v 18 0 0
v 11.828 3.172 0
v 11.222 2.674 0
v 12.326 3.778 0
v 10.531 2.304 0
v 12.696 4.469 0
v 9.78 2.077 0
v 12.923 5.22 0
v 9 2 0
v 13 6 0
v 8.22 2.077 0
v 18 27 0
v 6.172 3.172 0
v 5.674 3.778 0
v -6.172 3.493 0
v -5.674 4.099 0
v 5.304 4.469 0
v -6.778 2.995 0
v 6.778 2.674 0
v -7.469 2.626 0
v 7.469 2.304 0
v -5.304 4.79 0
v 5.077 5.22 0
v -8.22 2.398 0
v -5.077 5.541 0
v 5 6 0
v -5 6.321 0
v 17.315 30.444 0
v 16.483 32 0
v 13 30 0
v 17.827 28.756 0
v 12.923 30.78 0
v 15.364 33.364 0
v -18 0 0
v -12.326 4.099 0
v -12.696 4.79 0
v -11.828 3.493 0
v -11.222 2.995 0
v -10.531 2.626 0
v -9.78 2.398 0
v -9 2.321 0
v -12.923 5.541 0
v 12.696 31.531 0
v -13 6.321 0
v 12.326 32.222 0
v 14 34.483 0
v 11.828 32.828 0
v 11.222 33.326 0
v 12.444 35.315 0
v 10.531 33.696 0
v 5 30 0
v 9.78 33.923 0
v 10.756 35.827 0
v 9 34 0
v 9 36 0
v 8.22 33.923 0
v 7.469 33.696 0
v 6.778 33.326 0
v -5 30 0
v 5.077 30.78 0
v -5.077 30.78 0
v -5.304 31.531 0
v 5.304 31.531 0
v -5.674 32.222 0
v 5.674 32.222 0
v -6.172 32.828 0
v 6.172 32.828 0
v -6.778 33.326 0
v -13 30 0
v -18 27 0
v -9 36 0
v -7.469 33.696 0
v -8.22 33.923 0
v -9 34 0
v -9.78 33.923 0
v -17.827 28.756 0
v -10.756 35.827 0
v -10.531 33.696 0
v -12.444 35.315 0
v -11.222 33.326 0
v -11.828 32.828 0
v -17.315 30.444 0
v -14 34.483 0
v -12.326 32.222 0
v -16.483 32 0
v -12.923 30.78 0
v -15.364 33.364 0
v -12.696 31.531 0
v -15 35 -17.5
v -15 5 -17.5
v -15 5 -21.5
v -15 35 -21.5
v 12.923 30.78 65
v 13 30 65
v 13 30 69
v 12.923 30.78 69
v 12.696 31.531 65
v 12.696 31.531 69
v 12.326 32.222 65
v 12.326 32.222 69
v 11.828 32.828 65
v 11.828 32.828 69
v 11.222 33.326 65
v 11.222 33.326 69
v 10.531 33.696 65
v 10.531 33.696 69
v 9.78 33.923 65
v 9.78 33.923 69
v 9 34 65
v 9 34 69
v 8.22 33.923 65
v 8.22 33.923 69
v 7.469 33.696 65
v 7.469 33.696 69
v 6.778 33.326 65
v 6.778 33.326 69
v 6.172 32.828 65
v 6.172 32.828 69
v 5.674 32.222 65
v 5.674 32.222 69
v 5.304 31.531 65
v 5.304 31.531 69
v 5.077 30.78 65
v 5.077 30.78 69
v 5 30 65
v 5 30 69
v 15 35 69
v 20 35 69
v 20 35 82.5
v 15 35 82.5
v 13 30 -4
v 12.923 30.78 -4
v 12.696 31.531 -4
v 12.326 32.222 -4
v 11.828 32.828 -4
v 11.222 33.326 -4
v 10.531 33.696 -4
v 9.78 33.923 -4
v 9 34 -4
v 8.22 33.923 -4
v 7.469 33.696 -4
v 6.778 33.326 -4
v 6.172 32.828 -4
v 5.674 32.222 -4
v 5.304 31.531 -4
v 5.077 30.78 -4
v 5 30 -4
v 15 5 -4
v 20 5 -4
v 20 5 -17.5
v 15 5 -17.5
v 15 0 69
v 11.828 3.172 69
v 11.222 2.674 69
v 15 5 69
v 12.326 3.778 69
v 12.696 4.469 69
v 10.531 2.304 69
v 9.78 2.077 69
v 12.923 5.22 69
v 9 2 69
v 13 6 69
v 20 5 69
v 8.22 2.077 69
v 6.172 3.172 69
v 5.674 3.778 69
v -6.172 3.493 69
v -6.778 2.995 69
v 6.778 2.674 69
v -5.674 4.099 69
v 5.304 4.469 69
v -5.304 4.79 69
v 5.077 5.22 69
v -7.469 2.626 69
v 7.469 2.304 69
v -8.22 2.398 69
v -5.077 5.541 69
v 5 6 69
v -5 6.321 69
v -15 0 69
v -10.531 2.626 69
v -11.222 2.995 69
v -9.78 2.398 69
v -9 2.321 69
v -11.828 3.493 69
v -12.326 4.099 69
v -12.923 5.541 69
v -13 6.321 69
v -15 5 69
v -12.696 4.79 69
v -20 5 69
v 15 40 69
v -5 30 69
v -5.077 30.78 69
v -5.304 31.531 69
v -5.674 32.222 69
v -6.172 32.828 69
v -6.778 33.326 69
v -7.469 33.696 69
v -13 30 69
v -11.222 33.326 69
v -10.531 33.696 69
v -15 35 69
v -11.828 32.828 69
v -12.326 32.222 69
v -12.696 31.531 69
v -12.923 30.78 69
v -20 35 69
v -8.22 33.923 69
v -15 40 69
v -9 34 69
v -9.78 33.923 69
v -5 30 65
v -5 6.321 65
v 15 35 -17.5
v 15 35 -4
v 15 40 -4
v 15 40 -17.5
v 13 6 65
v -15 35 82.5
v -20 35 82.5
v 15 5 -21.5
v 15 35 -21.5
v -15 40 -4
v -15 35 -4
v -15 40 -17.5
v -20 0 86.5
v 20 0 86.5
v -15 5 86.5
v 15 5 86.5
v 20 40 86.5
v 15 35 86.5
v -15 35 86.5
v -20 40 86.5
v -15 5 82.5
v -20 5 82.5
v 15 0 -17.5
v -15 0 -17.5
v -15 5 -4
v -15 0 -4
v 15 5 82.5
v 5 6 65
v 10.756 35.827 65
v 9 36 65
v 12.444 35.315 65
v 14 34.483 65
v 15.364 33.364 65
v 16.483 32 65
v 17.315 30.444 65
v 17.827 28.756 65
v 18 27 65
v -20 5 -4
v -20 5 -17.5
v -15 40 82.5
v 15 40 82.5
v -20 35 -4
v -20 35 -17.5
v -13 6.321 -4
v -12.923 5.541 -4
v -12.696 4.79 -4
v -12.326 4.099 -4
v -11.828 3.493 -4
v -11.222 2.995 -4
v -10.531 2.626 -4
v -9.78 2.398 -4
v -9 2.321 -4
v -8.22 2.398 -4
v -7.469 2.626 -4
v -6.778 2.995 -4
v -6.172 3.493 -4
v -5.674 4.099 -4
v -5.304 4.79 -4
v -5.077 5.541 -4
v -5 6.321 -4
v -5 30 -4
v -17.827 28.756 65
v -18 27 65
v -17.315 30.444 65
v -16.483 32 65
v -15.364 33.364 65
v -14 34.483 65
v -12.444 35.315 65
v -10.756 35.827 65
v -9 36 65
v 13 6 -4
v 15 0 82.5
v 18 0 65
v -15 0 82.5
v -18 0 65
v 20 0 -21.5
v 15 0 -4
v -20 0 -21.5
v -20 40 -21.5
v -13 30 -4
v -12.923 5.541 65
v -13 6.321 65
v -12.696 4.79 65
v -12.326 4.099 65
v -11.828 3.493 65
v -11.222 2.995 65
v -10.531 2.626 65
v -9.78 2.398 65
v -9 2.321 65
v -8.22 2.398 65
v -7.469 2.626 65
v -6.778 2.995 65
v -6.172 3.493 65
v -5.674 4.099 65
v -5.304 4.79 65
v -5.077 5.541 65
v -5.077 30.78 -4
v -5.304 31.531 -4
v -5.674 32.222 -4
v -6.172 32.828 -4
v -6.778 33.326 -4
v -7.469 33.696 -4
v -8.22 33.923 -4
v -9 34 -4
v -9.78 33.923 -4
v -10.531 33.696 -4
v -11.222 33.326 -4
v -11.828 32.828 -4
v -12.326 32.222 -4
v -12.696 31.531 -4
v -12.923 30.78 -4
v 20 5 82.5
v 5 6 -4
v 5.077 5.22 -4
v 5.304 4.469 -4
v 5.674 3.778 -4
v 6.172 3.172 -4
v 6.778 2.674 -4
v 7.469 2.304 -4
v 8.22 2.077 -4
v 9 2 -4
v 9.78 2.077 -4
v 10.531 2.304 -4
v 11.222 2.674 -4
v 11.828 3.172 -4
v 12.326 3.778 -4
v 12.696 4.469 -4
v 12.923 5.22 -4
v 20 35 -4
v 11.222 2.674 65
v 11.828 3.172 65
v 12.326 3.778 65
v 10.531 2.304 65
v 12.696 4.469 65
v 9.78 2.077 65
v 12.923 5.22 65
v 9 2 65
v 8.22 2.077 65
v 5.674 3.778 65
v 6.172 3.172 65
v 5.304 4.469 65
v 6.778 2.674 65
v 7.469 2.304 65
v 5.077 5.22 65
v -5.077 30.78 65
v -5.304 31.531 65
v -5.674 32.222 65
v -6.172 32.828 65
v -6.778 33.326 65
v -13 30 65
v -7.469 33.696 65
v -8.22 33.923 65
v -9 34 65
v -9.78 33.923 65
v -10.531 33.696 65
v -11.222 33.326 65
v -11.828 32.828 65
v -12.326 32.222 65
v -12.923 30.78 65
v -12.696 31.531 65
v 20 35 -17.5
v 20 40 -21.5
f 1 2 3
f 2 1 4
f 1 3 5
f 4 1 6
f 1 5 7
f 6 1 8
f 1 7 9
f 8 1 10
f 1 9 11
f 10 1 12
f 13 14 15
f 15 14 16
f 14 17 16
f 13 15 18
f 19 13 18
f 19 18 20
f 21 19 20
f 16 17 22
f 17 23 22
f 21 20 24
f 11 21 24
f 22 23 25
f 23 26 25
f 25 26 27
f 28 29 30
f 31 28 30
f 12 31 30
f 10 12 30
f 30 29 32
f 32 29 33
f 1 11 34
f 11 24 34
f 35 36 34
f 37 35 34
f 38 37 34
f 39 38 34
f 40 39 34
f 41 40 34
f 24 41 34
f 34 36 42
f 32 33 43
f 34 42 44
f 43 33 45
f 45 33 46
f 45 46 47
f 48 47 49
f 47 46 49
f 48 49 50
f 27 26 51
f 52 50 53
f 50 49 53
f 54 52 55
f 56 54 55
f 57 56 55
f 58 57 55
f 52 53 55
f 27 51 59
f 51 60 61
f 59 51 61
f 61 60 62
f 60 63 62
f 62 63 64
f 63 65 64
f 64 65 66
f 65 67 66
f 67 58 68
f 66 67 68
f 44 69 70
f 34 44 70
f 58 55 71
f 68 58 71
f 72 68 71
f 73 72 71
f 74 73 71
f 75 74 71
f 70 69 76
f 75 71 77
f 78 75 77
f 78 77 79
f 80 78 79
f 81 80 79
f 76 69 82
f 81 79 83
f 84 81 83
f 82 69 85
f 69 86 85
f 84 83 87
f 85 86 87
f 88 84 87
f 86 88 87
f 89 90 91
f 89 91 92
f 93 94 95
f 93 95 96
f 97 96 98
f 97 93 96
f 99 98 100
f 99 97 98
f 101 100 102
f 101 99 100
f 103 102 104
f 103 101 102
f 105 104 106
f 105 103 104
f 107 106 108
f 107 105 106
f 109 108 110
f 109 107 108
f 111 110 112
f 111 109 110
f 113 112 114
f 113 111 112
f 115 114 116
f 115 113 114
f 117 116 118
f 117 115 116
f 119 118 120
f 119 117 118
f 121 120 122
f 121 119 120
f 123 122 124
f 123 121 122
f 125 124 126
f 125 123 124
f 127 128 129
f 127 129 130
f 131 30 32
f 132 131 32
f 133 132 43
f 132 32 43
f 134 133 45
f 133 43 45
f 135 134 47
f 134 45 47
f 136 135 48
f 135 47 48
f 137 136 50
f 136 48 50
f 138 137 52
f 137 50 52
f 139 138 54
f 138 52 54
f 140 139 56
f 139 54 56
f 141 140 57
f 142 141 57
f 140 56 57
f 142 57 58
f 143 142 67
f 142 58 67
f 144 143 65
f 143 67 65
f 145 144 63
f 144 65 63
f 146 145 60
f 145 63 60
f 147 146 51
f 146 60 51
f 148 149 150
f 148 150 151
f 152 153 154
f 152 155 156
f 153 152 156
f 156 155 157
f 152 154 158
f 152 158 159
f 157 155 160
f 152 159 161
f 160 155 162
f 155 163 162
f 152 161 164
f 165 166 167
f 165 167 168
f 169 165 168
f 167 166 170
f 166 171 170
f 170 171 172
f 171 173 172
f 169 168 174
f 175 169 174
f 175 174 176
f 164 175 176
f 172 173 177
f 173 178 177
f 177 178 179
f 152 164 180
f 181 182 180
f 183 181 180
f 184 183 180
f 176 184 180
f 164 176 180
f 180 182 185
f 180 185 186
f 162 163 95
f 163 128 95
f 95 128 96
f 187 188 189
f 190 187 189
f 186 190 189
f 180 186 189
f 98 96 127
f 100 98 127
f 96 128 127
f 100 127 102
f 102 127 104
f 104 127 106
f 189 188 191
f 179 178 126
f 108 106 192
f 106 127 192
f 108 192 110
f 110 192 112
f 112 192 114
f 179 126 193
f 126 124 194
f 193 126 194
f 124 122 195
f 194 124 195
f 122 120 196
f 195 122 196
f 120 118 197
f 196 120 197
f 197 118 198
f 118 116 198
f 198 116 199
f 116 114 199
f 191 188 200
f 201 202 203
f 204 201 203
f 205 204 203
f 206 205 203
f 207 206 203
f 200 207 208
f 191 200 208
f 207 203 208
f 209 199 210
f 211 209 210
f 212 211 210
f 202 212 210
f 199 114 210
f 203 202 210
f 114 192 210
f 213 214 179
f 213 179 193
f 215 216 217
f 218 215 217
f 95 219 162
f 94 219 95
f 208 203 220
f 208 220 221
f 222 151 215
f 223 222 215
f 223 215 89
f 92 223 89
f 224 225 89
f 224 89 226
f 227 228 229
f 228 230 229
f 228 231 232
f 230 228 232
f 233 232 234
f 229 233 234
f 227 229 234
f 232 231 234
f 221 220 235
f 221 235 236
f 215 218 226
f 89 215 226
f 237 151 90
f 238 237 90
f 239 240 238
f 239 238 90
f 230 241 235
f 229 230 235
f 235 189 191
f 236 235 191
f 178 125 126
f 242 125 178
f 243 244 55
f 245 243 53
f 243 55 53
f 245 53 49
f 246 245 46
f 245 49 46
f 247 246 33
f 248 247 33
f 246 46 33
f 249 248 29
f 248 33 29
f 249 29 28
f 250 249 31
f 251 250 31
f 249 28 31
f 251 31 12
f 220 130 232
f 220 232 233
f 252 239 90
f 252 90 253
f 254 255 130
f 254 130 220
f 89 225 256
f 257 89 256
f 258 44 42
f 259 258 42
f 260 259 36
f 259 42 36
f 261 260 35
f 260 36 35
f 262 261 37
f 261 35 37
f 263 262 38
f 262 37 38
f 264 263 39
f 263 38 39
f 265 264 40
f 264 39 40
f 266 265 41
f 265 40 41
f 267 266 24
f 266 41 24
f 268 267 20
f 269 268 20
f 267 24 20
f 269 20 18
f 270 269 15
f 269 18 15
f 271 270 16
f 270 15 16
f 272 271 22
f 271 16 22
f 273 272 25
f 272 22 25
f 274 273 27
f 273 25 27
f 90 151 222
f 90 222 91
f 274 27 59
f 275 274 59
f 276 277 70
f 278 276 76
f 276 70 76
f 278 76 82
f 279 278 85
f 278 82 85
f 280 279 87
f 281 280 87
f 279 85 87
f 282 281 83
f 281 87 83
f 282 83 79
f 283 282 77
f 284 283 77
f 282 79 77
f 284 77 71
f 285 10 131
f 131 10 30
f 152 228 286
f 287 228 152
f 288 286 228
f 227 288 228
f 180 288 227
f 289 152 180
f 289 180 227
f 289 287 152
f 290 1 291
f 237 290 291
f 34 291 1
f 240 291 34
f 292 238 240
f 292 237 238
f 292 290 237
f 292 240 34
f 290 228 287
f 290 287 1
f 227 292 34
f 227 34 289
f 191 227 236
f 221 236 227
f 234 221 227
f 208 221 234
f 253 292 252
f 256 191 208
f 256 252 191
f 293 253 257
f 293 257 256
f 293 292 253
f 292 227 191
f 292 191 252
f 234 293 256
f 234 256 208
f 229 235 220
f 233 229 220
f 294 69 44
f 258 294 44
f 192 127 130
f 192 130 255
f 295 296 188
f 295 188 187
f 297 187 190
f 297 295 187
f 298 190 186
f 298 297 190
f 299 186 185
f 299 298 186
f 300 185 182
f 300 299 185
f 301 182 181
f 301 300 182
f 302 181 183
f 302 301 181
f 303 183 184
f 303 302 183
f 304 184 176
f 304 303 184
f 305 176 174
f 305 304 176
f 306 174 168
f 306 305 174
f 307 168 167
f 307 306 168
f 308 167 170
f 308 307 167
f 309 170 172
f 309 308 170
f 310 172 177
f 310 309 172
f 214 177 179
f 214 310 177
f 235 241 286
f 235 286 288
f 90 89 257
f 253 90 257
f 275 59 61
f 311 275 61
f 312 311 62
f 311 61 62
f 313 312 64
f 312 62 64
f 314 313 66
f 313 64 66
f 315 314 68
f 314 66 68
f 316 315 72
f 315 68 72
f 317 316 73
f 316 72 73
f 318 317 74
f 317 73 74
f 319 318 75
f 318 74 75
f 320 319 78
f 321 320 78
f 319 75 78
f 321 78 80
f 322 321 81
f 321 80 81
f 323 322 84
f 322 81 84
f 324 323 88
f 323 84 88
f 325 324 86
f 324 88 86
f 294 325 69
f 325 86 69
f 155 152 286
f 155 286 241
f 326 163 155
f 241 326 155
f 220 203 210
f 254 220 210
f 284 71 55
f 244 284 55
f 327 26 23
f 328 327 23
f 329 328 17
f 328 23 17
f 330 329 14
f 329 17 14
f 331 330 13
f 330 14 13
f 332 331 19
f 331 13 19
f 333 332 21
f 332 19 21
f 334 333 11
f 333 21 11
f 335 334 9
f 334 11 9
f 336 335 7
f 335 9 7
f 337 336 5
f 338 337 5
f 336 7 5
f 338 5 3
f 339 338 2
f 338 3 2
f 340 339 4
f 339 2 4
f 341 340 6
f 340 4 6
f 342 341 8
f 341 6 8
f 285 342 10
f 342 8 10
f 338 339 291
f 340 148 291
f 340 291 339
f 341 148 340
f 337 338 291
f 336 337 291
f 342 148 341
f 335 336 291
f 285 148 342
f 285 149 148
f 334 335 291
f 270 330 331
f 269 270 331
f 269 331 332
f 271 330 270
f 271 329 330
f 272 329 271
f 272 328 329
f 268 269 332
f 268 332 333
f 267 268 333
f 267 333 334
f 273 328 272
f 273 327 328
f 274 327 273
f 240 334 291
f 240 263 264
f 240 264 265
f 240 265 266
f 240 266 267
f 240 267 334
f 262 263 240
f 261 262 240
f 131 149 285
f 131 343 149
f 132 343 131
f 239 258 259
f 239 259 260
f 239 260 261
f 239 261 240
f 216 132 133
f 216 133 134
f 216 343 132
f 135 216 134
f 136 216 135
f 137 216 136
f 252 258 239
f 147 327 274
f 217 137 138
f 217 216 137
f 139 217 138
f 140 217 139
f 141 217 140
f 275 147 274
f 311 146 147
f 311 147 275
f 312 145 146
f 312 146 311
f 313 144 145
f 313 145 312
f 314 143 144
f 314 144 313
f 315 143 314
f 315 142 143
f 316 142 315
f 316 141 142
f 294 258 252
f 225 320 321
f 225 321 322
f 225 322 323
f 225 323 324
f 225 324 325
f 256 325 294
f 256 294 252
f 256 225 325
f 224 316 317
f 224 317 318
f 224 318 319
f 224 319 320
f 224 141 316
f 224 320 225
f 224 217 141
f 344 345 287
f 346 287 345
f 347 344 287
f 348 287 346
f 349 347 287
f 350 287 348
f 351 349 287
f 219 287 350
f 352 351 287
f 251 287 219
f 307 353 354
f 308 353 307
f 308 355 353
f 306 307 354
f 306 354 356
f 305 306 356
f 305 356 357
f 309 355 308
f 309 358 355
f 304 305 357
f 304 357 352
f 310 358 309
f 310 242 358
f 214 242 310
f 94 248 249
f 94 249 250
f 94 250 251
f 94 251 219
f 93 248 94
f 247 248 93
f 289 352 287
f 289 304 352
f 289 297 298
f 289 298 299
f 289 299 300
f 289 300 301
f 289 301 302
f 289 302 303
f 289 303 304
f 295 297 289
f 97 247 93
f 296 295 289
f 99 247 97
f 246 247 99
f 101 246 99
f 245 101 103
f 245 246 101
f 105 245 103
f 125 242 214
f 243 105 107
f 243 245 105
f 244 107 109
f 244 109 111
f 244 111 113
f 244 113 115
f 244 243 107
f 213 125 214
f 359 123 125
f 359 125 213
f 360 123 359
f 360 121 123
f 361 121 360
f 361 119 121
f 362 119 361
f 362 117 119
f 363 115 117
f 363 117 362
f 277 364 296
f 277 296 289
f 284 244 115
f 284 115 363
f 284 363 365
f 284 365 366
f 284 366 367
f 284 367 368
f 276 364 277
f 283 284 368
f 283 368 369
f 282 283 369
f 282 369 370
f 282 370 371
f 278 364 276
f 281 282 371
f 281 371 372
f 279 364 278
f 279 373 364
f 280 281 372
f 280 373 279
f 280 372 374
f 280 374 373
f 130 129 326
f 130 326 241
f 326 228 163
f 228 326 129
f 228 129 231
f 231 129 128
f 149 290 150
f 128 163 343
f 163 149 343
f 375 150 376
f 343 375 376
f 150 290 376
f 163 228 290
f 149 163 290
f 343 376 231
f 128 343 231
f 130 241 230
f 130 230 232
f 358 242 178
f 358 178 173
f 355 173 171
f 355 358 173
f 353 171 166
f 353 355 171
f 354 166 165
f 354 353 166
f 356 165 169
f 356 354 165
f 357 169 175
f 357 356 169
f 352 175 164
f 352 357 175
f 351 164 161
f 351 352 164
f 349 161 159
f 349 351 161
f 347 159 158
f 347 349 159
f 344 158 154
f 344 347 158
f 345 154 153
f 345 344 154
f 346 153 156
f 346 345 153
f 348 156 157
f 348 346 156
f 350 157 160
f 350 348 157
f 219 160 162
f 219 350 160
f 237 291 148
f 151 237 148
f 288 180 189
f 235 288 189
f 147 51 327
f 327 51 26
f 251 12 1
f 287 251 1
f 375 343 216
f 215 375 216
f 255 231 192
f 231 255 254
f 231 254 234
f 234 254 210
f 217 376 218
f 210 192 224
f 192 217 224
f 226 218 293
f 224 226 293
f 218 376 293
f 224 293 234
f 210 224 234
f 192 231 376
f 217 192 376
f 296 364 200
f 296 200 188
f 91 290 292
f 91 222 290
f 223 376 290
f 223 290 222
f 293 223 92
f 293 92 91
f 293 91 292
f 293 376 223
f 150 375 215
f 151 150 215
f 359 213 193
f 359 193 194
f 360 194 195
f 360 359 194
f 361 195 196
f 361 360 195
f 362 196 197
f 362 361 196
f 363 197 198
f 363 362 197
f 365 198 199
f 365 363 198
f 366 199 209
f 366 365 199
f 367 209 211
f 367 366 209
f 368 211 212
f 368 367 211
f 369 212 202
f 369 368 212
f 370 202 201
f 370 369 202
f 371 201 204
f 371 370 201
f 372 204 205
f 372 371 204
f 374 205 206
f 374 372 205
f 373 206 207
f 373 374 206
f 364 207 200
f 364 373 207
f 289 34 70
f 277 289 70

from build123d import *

# Parameters (mm, degrees)
RESSALTO_EXTRUS_O1_DEPTH = 65
ESBO_O2_W                = 40
ESBO_O2_H                = 40
RESSALTO_EXTRUS_O2_DEPTH = 4
ESBO_O4_W                = 5
ESBO_O4_H                = 5
RESSALTO_EXTRUS_O3_DEPTH = 13.5
ESBO_O5_W                = 40
ESBO_O5_H                = 40
ESBO_O5_W_2              = 30
ESBO_O5_H_2              = 30
RESSALTO_EXTRUS_O4_DEPTH = 4


with BuildPart() as part:
    # Esboço1 → Ressalto-extrusão1 (new body)
    with BuildSketch(Plane.XY):
        with BuildLine():
            Line((18, 0), (20, 0))
            Line((20, 0), (20, 40))
            Line((20, 40), (-20, 40))
            Line((-20, 40), (-20, 0))
            Line((-20, 0), (-18, 0))
            Line((-18, 0), (-18, 9))
            Line((-18, 9), (-18, 27))
            ThreePointArc((-18, 27), (-15.363961031, 33.363961031), (-9, 36))
            Line((-9, 36), (9, 36))
            ThreePointArc((9, 36), (15.363961031, 33.363961031), (18, 27))
            Line((18, 27), (18, 0))
        make_face()
    extrude(amount=RESSALTO_EXTRUS_O1_DEPTH)

    # Esboço2 → Ressalto-extrusão2 (add)
    with BuildSketch(Plane(origin=(0, 0, 0), x_dir=(-1, 0, 0), z_dir=(0, 0, -1))):
        with Locations((0, 20)):
            Rectangle(ESBO_O2_W, ESBO_O2_H)
        with BuildLine():
            Line((-5, 30), (-5, 6))
            ThreePointArc((-5, 6), (-9, 2), (-13, 6))
            Line((-13, 6), (-13, 30))
            ThreePointArc((-13, 30), (-9, 34), (-5, 30))
        make_face(mode=Mode.SUBTRACT)
        with BuildLine():
            Line((13, 30), (13, 6.321034479))
            ThreePointArc((13, 6.321034479), (9, 2.321034479), (5, 6.321034479))
            Line((5, 6.321034479), (5, 30))
            ThreePointArc((5, 30), (9, 34), (13, 30))
        make_face(mode=Mode.SUBTRACT)
    ressalto_extrus_o2 = extrude(amount=RESSALTO_EXTRUS_O2_DEPTH)

    # Esboço4 → Ressalto-extrusão3 (add)
    with BuildSketch(Plane(origin=(0, 0, -4), x_dir=(-1, 0, 0), z_dir=(0, 0, -1))):
        with Locations((17.5, 37.5)):
            Rectangle(ESBO_O4_W, ESBO_O4_H)
        with Locations((17.5, 2.5)):
            Rectangle(ESBO_O4_W, ESBO_O4_H)
        with Locations((-17.5, 37.5)):
            Rectangle(ESBO_O4_W, ESBO_O4_H)
        with Locations((-17.5, 2.5)):
            Rectangle(ESBO_O4_W, ESBO_O4_H)
    ressalto_extrus_o3 = extrude(amount=RESSALTO_EXTRUS_O3_DEPTH)

    # Esboço5 → Ressalto-extrusão4 (add)
    with BuildSketch(Plane(origin=(0, 0, -17.5), x_dir=(-1, 0, 0), z_dir=(0, 0, -1))):
        with Locations((0, 20)):
            Rectangle(ESBO_O5_W, ESBO_O5_H)
        with Locations((0, 20)):
            Rectangle(ESBO_O5_W_2, ESBO_O5_H_2, mode=Mode.SUBTRACT)
    ressalto_extrus_o4 = extrude(amount=RESSALTO_EXTRUS_O4_DEPTH)

    # Espelhar1: Ressalto-extrusão2, Ressalto-extrusão3, Ressalto-extrusão4 across plane
    add(ressalto_extrus_o2.mirror(Plane.XY.offset(32.5)))
    add(ressalto_extrus_o3.mirror(Plane.XY.offset(32.5)))
    add(ressalto_extrus_o4.mirror(Plane.XY.offset(32.5)))


solid = part.part
